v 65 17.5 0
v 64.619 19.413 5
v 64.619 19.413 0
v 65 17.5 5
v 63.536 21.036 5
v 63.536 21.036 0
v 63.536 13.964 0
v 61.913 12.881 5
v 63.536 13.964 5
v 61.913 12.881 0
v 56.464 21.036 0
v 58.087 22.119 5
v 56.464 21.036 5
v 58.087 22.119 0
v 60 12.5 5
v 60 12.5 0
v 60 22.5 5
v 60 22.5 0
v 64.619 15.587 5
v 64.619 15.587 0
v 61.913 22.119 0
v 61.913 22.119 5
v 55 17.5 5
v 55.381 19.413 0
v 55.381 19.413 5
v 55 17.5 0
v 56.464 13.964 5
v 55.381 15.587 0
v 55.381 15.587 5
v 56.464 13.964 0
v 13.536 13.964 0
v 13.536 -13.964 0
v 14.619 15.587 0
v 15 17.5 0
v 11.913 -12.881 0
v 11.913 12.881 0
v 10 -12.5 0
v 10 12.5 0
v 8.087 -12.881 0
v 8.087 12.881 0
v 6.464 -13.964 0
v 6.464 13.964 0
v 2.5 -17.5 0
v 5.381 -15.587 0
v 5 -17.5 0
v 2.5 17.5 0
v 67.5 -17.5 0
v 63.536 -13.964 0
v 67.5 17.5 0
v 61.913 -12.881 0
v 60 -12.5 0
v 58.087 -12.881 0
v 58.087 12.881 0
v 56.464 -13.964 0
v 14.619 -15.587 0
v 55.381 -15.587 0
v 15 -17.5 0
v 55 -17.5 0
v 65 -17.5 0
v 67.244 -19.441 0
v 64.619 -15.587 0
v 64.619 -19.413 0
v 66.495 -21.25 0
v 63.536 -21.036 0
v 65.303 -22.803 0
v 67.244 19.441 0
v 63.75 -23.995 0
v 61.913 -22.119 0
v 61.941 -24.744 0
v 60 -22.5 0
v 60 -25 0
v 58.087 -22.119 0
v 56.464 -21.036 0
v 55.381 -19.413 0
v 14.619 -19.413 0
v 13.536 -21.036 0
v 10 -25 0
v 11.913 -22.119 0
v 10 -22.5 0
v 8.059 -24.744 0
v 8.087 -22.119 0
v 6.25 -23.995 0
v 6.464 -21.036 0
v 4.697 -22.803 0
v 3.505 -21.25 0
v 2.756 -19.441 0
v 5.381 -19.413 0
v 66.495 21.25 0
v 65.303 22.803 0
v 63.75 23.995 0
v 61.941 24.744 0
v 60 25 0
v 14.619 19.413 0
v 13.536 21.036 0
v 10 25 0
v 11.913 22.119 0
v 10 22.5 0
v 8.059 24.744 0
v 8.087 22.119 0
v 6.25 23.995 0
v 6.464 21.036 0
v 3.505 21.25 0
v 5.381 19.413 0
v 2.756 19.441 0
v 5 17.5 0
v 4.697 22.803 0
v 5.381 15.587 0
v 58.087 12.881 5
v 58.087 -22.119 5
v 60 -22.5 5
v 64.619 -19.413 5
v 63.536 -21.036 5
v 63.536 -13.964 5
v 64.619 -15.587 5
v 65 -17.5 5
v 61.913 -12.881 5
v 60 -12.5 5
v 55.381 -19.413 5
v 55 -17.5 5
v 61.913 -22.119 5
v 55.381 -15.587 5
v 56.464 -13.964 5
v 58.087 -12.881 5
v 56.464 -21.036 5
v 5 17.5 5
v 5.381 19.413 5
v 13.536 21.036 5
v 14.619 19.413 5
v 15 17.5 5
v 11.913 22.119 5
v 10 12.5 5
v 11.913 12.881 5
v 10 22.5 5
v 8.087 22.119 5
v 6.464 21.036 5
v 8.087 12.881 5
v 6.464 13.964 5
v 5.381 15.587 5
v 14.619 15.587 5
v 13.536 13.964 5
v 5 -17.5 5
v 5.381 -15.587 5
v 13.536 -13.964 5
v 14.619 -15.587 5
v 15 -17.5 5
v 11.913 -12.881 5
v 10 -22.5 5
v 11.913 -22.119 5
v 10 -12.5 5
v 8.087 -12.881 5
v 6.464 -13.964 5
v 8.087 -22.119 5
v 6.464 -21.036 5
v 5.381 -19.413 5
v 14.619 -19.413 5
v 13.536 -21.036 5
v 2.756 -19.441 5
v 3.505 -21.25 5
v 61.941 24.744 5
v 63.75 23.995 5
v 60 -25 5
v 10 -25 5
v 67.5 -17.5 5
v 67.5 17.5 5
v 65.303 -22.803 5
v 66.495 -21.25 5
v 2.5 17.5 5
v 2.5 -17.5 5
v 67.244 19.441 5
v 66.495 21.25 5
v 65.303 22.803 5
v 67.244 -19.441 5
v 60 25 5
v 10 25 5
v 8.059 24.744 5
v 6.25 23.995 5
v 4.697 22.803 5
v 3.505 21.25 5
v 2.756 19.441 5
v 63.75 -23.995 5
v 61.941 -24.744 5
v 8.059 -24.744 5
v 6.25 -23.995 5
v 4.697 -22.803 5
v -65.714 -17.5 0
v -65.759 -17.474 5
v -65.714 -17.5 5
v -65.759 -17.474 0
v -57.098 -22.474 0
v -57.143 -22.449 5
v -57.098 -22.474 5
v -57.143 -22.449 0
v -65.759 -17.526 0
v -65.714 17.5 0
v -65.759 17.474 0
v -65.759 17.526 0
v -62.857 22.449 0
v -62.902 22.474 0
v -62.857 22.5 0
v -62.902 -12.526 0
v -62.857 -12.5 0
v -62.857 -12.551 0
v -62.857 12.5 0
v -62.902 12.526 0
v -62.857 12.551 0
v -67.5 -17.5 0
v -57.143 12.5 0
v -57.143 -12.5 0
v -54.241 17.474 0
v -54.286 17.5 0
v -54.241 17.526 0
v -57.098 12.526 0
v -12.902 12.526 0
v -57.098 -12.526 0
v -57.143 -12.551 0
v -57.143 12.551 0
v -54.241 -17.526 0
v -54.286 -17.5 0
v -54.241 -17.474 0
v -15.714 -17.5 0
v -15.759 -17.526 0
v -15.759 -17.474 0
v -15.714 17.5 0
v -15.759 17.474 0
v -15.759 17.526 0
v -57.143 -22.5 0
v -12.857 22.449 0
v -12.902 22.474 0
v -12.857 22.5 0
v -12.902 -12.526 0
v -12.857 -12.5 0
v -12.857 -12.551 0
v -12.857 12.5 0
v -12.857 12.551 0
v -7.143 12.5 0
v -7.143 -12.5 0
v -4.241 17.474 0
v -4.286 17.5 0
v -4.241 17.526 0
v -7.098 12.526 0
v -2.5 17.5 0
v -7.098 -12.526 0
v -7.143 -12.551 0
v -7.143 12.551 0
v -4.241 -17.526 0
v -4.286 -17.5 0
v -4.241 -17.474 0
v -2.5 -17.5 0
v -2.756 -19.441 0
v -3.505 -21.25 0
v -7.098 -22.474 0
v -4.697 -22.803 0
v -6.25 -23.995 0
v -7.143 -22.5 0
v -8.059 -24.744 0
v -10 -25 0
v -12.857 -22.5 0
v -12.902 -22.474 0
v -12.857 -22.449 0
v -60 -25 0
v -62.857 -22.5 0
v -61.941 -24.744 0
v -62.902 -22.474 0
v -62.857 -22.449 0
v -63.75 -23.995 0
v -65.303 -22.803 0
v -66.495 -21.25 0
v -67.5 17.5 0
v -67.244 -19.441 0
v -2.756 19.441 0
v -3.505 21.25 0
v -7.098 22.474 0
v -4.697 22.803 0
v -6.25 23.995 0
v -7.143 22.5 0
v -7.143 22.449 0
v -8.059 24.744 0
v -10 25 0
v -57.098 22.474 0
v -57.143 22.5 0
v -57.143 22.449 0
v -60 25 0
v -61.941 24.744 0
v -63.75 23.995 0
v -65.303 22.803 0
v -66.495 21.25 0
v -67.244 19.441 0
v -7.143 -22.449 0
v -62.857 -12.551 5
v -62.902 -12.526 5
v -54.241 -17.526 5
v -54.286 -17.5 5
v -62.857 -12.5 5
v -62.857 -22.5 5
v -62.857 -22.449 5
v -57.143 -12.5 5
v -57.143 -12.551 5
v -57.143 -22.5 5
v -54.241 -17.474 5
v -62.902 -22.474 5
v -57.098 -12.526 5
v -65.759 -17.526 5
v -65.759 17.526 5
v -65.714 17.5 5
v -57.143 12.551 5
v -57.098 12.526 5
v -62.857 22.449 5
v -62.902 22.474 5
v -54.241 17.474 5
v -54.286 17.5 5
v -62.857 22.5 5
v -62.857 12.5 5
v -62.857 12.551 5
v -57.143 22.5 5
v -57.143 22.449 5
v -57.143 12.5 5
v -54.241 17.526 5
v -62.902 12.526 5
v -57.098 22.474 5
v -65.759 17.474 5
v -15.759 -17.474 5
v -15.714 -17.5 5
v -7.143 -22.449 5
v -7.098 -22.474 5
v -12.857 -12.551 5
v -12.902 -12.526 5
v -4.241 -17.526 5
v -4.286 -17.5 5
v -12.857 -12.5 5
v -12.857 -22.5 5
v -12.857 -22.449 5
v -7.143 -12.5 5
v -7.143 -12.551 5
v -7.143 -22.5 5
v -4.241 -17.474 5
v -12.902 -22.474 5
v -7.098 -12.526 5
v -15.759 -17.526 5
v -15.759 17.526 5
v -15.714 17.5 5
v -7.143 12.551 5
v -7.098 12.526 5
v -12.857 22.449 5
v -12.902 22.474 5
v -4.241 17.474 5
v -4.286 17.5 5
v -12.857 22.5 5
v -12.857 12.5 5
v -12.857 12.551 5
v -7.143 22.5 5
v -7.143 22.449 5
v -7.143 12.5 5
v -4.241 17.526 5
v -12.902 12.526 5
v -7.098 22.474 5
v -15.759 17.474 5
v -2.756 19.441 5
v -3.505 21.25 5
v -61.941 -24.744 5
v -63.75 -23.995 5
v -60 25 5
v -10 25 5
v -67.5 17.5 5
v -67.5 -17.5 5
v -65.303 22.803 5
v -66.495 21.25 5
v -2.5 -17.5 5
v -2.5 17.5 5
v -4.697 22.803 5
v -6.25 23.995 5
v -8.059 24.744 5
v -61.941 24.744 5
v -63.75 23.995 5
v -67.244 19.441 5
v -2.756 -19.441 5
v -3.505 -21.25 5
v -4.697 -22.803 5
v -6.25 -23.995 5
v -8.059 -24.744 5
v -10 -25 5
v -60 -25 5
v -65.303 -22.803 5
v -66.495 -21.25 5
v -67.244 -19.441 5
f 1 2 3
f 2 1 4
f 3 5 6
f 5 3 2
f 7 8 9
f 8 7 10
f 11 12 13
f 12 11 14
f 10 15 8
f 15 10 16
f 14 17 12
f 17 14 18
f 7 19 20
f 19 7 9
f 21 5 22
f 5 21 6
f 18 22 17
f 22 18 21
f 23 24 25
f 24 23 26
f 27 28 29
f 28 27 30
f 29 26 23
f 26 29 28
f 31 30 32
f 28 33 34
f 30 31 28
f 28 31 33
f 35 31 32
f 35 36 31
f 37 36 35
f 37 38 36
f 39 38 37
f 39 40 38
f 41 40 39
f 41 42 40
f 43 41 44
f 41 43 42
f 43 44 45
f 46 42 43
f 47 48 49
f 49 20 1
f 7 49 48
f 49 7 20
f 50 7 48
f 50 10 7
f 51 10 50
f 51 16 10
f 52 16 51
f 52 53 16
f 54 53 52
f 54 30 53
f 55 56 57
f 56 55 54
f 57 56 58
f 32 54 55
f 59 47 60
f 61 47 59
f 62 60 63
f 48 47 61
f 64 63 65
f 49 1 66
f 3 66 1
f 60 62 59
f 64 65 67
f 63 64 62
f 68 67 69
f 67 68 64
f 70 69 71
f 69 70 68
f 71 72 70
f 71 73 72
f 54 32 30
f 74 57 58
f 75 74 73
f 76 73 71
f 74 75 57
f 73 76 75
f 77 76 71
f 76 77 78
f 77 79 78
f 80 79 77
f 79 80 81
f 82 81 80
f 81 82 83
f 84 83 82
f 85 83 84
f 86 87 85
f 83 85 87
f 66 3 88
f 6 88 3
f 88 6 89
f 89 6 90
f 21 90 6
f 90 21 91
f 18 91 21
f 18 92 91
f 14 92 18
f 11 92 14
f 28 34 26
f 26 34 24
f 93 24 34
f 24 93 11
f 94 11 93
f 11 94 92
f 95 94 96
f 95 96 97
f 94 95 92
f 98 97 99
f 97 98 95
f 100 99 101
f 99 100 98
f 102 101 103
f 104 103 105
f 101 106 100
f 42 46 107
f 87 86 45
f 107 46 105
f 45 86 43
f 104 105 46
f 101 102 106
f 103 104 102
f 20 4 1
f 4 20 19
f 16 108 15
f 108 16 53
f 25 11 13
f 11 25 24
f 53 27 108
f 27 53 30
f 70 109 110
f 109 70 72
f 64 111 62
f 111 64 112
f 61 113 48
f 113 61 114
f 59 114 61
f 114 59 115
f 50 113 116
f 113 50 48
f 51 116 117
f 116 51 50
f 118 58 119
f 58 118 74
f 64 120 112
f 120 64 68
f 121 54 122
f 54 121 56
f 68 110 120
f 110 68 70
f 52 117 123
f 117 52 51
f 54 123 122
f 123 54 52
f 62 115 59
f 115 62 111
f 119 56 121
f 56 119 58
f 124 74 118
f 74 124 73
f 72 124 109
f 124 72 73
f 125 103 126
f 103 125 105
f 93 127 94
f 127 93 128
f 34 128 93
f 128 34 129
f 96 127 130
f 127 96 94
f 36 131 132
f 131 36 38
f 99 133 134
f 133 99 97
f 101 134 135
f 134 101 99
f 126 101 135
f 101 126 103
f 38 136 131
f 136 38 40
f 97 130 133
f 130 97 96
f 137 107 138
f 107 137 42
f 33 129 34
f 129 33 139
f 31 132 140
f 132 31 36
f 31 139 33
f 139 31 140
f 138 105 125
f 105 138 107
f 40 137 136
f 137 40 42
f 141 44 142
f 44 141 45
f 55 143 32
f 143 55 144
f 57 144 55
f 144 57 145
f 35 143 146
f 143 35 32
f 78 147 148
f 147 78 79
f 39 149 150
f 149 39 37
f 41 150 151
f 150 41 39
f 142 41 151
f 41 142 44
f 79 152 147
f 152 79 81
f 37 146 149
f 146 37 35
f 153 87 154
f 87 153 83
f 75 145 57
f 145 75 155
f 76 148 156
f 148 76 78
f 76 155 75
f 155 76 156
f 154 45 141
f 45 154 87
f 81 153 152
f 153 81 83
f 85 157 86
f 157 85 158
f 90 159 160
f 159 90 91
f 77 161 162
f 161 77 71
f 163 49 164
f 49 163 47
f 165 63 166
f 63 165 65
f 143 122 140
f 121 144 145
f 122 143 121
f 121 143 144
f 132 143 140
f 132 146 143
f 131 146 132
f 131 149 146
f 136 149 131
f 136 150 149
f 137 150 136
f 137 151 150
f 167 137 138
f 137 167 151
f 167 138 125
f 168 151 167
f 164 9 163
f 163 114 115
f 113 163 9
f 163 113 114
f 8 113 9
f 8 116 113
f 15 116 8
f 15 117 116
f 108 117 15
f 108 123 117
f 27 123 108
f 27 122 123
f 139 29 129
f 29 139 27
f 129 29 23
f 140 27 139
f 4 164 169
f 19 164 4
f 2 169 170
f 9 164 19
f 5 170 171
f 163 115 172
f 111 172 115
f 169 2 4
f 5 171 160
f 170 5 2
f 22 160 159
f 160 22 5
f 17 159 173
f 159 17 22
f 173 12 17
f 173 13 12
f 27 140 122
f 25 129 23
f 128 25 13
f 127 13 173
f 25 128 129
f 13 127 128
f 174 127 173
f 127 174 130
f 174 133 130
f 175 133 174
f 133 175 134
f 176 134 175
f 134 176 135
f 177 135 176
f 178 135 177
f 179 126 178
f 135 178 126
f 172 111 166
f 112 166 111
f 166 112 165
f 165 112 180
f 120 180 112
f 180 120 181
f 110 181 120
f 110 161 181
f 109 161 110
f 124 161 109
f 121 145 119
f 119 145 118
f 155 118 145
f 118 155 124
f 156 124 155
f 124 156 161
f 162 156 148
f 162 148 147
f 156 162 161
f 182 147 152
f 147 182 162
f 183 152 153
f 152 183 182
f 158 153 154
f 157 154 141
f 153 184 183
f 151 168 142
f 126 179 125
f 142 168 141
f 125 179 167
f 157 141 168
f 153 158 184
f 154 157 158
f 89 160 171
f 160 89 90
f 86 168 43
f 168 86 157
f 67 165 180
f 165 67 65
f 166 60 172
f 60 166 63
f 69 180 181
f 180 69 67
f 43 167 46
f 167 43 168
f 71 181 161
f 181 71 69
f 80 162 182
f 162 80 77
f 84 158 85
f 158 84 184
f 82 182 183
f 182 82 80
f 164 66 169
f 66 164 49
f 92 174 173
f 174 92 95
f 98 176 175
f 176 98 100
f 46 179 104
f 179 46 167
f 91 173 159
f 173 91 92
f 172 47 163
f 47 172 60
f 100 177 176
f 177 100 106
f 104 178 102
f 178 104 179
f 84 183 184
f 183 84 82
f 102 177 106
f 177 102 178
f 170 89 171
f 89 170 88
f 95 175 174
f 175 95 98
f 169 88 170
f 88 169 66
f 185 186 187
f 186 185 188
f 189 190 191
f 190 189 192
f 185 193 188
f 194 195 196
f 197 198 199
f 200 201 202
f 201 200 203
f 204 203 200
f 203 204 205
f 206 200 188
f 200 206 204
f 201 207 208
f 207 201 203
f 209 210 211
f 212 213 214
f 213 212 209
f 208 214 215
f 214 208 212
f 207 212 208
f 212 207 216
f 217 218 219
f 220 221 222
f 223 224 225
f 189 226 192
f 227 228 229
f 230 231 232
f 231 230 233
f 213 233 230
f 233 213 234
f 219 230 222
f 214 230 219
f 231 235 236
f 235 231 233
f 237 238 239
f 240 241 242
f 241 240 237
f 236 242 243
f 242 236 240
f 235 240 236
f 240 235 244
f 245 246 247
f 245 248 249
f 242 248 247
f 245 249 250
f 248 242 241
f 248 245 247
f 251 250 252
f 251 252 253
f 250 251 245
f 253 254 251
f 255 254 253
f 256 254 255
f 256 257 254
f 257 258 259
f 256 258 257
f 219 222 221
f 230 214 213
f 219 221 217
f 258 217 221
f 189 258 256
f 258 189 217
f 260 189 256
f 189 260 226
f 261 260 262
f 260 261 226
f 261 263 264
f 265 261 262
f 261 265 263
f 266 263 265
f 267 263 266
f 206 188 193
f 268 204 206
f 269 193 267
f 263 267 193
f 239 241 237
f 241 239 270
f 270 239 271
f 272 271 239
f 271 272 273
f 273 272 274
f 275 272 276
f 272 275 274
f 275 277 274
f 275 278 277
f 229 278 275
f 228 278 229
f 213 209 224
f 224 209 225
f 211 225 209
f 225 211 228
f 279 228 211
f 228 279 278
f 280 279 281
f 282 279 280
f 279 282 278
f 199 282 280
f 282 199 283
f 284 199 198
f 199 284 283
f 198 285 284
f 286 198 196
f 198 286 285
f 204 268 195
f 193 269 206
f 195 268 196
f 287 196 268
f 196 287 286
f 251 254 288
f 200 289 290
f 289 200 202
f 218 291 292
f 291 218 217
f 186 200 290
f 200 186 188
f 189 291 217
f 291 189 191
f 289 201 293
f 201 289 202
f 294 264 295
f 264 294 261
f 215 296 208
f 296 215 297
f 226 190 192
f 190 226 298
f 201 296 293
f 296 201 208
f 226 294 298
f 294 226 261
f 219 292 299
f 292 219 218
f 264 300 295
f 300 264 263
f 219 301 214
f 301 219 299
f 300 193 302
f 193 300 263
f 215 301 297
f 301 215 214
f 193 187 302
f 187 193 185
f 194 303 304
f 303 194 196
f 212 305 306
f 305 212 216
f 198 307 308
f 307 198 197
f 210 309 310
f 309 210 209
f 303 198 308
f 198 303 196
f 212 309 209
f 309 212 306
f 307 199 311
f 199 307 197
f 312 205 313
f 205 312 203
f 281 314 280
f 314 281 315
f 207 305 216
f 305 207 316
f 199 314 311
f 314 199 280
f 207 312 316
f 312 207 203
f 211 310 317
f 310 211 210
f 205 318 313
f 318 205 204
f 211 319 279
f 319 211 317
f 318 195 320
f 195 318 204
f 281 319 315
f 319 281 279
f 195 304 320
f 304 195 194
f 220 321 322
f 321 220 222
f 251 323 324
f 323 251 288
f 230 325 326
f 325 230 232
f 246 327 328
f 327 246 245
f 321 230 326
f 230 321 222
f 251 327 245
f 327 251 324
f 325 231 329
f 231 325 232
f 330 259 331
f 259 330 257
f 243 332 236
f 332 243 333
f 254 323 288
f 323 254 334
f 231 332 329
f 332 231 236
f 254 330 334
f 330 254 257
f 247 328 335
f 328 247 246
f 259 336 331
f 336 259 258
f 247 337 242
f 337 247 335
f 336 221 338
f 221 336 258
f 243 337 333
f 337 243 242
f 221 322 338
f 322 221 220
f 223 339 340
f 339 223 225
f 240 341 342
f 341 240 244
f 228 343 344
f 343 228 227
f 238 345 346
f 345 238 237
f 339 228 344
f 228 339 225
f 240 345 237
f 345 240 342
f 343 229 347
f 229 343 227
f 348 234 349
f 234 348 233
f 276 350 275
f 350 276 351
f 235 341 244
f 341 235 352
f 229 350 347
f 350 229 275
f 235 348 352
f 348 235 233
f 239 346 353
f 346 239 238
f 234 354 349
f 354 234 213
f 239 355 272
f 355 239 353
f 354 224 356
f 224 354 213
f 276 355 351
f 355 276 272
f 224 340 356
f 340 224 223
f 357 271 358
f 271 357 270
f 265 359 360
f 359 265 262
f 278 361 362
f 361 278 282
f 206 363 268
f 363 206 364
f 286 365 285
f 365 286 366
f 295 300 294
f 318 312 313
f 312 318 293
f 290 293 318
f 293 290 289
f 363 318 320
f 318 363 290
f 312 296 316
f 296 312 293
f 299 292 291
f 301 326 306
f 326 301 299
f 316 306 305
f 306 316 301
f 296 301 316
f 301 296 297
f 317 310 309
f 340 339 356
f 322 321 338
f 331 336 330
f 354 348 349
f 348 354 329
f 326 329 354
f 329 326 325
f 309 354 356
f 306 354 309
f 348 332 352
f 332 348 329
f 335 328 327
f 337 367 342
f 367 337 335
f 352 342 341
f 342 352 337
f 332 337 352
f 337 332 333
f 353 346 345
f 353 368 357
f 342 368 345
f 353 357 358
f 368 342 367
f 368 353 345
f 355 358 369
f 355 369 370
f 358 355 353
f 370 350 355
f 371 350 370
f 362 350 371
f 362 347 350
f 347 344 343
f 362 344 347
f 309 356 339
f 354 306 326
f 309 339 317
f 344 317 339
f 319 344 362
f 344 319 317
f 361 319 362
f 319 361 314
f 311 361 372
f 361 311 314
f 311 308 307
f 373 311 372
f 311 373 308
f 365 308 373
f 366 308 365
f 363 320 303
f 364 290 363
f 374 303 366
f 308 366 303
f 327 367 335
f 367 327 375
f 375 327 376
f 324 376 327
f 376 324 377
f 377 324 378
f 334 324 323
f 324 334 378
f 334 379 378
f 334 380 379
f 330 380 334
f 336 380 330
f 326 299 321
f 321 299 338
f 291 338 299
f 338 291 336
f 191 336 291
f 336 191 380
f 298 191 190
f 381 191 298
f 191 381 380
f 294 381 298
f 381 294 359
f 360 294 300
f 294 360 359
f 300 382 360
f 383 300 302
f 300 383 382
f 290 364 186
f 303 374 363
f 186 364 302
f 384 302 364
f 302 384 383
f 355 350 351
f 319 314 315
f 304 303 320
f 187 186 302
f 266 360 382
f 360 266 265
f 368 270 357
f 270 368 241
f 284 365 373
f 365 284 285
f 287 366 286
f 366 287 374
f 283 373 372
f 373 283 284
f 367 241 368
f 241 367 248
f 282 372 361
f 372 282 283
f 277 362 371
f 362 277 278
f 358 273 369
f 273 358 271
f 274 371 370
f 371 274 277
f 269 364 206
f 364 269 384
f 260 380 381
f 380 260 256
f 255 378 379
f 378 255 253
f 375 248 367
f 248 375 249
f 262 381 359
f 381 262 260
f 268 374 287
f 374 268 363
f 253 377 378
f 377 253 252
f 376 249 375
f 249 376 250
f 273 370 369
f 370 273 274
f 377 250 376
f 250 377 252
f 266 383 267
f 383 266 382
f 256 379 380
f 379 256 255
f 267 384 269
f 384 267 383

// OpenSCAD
lockHolderSet
(
	diameterTopTube = 30,
	lengthLock = 50,
	diameterLock = 15,
	nutSizeOuter = 10,
	nutSizeInner = 6,
	thickness = 5,
	offset = 2,
	screwOffsetShare = 0
);

// Functions
// - Set of Top Part and Bottom Part
module lockHolderSet
(
	diameterTopTube = 30,
	lengthLock = 50,
	diameterLock = 15,
	nutSizeOuter = 10,
	nutSizeInner = 6,
	thickness = 5,
	offset = 2,
	screwOffsetShare = 0.75
)
{
	lengthTopTube = diameterLock + (2 * nutSizeOuter) + (3 * thickness);
	screwBarWidth = nutSizeOuter + (thickness / 2);

	translate(v = [(diameterTopTube / 2) + screwBarWidth + (1.5 * thickness), 0, 0]) {
		topPart(diameterTopTube, diameterLock, nutSizeOuter, nutSizeInner, thickness, offset, screwOffsetShare);
	}

	translate(v = [(-1) * ((diameterTopTube / 2) + screwBarWidth + (1.5 * thickness)), 0, 0]) {
		rotate(a = [0, 0, 180]) {
			bottomPart(diameterTopTube, lengthLock, diameterLock, nutSizeOuter, nutSizeInner, thickness, offset, screwOffsetShare);
		}
	}
}

// - Complete Set of 2 Top Parts and 2 Bottom Parts
module completeLockHolderSet
(
	diameterTopTube = 30,
	lengthLock = 50,
	diameterLock = 15,
	nutSizeOuter = 10,
	nutSizeInner = 6,
	thickness = 5,
	offset = 2,
	screwOffsetShare = 0.75
)
{
	lengthTopTube = diameterLock + (2 * nutSizeOuter) + (3 * thickness);
	screwBarWidth = nutSizeOuter + (thickness / 2);

	translate(v = [0, (lengthTopTube + thickness) / 2, 0]) {
		lockHolderSet(diameterTopTube, lengthLock, diameterLock, nutSizeOuter, nutSizeInner, thickness, offset, screwOffsetShare);
	}

	translate(v = [0, (-1) * ((lengthTopTube + thickness) / 2), 0]) {
		lockHolderSet(diameterTopTube, lengthLock, diameterLock, nutSizeOuter, nutSizeInner, thickness, offset, screwOffsetShare);
	}
}

// - Top Part
module topPart
(
	diameterTopTube = 30,
	diameterLock = 15,
	nutSizeOuter = 10,
	nutSizeInner = 6,
	thickness = 5,
	offset = 2,
	screwOffsetShare = 0.75
)
{
	lengthTopTube = diameterLock + (2 * nutSizeOuter) + (3 * thickness);
	screwBarWidth = nutSizeOuter + (thickness / 2);

	translate(v = [0, lengthTopTube / 2, 0]) {
		topPart1(lengthTopTube, diameterTopTube, diameterLock, screwBarWidth, nutSizeOuter, nutSizeInner, thickness, offset, screwOffsetShare);
	}
}

// - Bottom Part
module bottomPart
(
	diameterTopTube = 30,
	lengthLock = 50,
	diameterLock = 15,
	nutSizeOuter = 10,
	nutSizeInner = 6,
	thickness = 5,
	offset = 2,
	screwOffsetShare = 0.75
)
{
	lengthTopTube = diameterLock + (2 * nutSizeOuter) + (3 * thickness);
	screwBarWidth = nutSizeOuter + (thickness / 2);

	translate(v = [0, lengthTopTube / 2, 0]) {
		bottomPart1(lengthTopTube, diameterTopTube, lengthLock, diameterLock, screwBarWidth, nutSizeOuter, nutSizeInner, thickness, offset, screwOffsetShare);
	}
}

// Modules
module tube(height, diameter, thickness) {
	difference() {
		cylinder(h = height, r = ((diameter / 2) + thickness));
		translate(v = [0, 0, -1]) {
			cylinder(h = height + 2, r = diameter / 2);
		}
	}
}

module screwBar(nutSizeOuter, lengthTopTube, diameterTopTube, thickness, offset, screwOffsetShare) {
		union() {
			hull() {
				translate(v = [((diameterTopTube + nutSizeOuter) / 2) + thickness, thickness + (offset / 2), (nutSizeOuter + thickness) / 2]) {
					rotate(a = [90, 0, 0]) {
						cylinder(r = ((nutSizeOuter + thickness) / 2), h = thickness);
					}
				}
				translate(v = [(-1) * (((diameterTopTube + nutSizeOuter) / 2) + thickness), thickness + (offset / 2), (nutSizeOuter + thickness) / 2]) {
					rotate(a = [90, 0, 0]) {
						cylinder(r = (nutSizeOuter + thickness) / 2, h = thickness);
					}
				}
				translate(v = [((diameterTopTube + nutSizeOuter) / 2) + thickness, thickness + (offset / 2), lengthTopTube - ((nutSizeOuter + thickness) / 2) ]) {
					rotate(a = [90, 0, 0]) {
						cylinder(r = ((nutSizeOuter + thickness) / 2), h = thickness);
					}
				}
				translate(v = [(-1) * (((diameterTopTube + nutSizeOuter) / 2) + thickness), thickness + (offset / 2), lengthTopTube - ((nutSizeOuter + thickness) / 2)]) {
					rotate(a = [90, 0, 0]) {
						cylinder(r = ((nutSizeOuter + thickness) / 2), h = thickness);
					}
				}
			}
//			positionShells(nutSizeOuter, diameterTopTube + (2 * thickness), lengthTopTube, thickness, offset, screwOffsetShare);
// add again later
		}
}

module tubeWithBar(lengthTopTube, diameterTopTube, nutSizeOuter, thickness, offset, screwOffsetShare) {
	screwBar(nutSizeOuter, lengthTopTube, diameterTopTube, thickness, offset, screwOffsetShare);
}

module makeShell(diameter, thickness, offset, screwOffsetShare) {
	translate(v = [0, ((1 + screwOffsetShare) * thickness) + (offset / 2), 0]) {
		rotate(a = [90, 0, 0]) {
			cylinder(r = (diameter + thickness) / 2, h = thickness);
		}
	}
}

module makeNut(diameter, thickness, screwOffsetShare) {
	translate(v = [0, (screwOffsetShare * thickness) + 1, 0]) {
		rotate(a = [90, 0, 0]) {
			translate(v = [0, 0, (-1) * (thickness / 2)]) {
				hexagon(size = diameter, height = thickness + 2);
			}
		}
	}
}

module screwHeadHole(diameter, thickness, screwOffsetShare) {
	translate(v = [0, (screwOffsetShare * thickness), 0]) {
		rotate(a = [-90, 0, 0]) {
			cylinder(r = diameter / 2, h = thickness + 2);
		}
	}
}

module screwHole(diameter, thickness) {
	translate(v = [0, -1, 0]) {
		rotate(a = [-90, 0, 0]) {
			cylinder(r = diameter / 2, h = (2 * thickness) + 2);
		}
	}
}

module positionShells(diameter, plateSizeX, plateSizeY, thickness, offset, screwOffsetShare) {
	translate(v = [(plateSizeX + diameter) / 2, 0, ((diameter + thickness) / 2)]) {
		makeShell(diameter, thickness, offset, screwOffsetShare);
	}
	translate(v = [(plateSizeX + diameter) / 2, 0, plateSizeY - ((diameter + thickness) / 2)]) {
		makeShell(diameter, thickness, offset, screwOffsetShare);
	}
	translate(v = [(-1) * ((plateSizeX + diameter) / 2), 0, ((diameter + thickness) / 2)]) {
		makeShell(diameter, thickness, offset, screwOffsetShare);
	}
	translate(v = [(-1) * ((plateSizeX + diameter) / 2), 0, plateSizeY - ((diameter + thickness) / 2)]) {
		makeShell(diameter, thickness, offset, screwOffsetShare);
	}
}

module positionNuts(diameter, plateSizeX, plateSizeY, thickness, screwOffsetShare) {
	translate(v = [(plateSizeX + diameter) / 2, 0, ((diameter + thickness) / 2)]) {
		makeNut(diameter, thickness, screwOffsetShare);
	}
	translate(v = [(plateSizeX + diameter) / 2, 0, plateSizeY - ((diameter + thickness) / 2)]) {
		makeNut(diameter, thickness, screwOffsetShare);
	}
	translate(v = [(-1) * ((plateSizeX + diameter) / 2), 0, ((diameter + thickness) / 2)]) {
		makeNut(diameter, thickness, screwOffsetShare);
	}
	translate(v = [(-1) * ((plateSizeX + diameter) / 2), 0, plateSizeY - ((diameter + thickness) / 2)]) {
		makeNut(diameter, thickness, screwOffsetShare);
	}
}

module positionScrewHeadHoles(diameter, plateSizeX, plateSizeY, thickness, screwOffsetShare) {
	translate(v = [(plateSizeX + diameter) / 2, 0, ((diameter + thickness) / 2)]) {
		screwHeadHole(diameter, thickness, screwOffsetShare);
	}
	translate(v = [(plateSizeX + diameter) / 2, 0, plateSizeY - ((diameter + thickness) / 2)]) {
		screwHeadHole(diameter, thickness, screwOffsetShare);
	}
	translate(v = [(-1) * ((plateSizeX + diameter) / 2), 0, ((diameter + thickness) / 2)]) {
		screwHeadHole(diameter, thickness, screwOffsetShare);
	}
	translate(v = [(-1) * ((plateSizeX + diameter) / 2), 0, plateSizeY - ((diameter + thickness) / 2)]) {
		screwHeadHole(diameter, thickness, screwOffsetShare);
	}
}

module positionScrewHoles(diameterInner, diameterOuter, plateSizeX, plateSizeY, thickness) {
	translate(v = [(plateSizeX + diameterOuter) / 2, 0, ((diameterOuter + thickness) / 2)]) {
		screwHole(diameterInner, thickness);
	}
	translate(v = [(plateSizeX + diameterOuter) / 2, 0, plateSizeY - ((diameterOuter + thickness) / 2)]) {
		screwHole(diameterInner, thickness);
	}
	translate(v = [(-1) * ((plateSizeX + diameterOuter) / 2), 0, ((diameterOuter + thickness) / 2)]) {
		screwHole(diameterInner, thickness);
	}
	translate(v = [(-1) * ((plateSizeX + diameterOuter) / 2), 0, plateSizeY - ((diameterOuter + thickness) / 2)]) {
		screwHole(diameterInner, thickness);
	}
}

module nutHolesComplete(diameterOuter, diameterInner, plateSizeX, plateSizeY, thickness, offset, screwOffsetShare) {
	translate(v = [0, offset / 2, 0]) {
		union() {
			positionNuts(diameterOuter, plateSizeX, plateSizeY, thickness, screwOffsetShare);
			positionScrewHoles(diameterInner, diameterOuter, plateSizeX, plateSizeY, thickness);
		}
	}
}

module screwHeadHolesComplete(diameterOuter, diameterInner, plateSizeX, plateSizeY, thickness, offset, screwOffsetShare) {
	translate(v = [0, offset / 2, 0]) {
		union() {
			positionScrewHeadHoles(diameterOuter, plateSizeX, plateSizeY, thickness, screwOffsetShare);
			positionScrewHoles(diameterInner, diameterOuter, plateSizeX, plateSizeY, thickness);
		}
	}
}

module topPart1(lengthTopTube, diameterTopTube, diameterLock, screwBarWidth, nutSizeOuter, nutSizeInner, thickness, offset, screwOffsetShare) {
translate(v = [0, 0, (-1) * (offset / 2)]) {
		rotate(a = [90, 0, 0]) {
				difference() {
					tubeWithBar(lengthTopTube, diameterTopTube, nutSizeOuter, thickness, offset, screwOffsetShare);
#					screwHeadHolesComplete(nutSizeOuter, nutSizeInner, diameterTopTube + (2 * thickness), lengthTopTube, thickness, offset, screwOffsetShare);
				}
			}
	}
}

module bottomPart1(lengthTopTube, diameterTopTube, lengthLock, diameterLock, screwBarWidth, nutSizeOuter, nutSizeInner, thickness, offset, screwOffsetShare) {
	translate(v = [0, 0, (-1) * (offset / 2)]) {
		rotate(a = [90, 0, 0]) {
					difference() {
						tubeWithBar(lengthTopTube, diameterTopTube, nutSizeOuter, thickness, offset, screwOffsetShare);
#						nutHolesComplete(nutSizeOuter, nutSizeInner, diameterTopTube + (2 * thickness), lengthTopTube, thickness, offset, screwOffsetShare);
					}
				}
	}
}

module hexagon(size, height) {
	// http://svn.clifford.at/openscad/trunk/libraries/shapes.scad
	/*
	 *  OpenSCAD Shapes Library (www.openscad.org)
	 *  Copyright (C) 2009  Catarina Mota
	 *
	 *  This program is free software; you can redistribute it and/or modify
	 *  it under the terms of the GNU General Public License as published by
	 *  the Free Software Foundation; either version 2 of the License, or
	 *  (at your option) any later version.
	 *
	 *  This program is distributed in the hope that it will be useful,
	 *  but WITHOUT ANY WARRANTY; without even the implied warranty of
	 *  MERCHANTABILITY or FITNESS FOR A PARTICULAR PURPOSE.  See the
	 *  GNU General Public License for more details.
	 *
	 *  You should have received a copy of the GNU General Public License
	 *  along with this program; if not, write to the Free Software
	 *  Foundation, Inc., 59 Temple Place, Suite 330, Boston, MA  02111-1307  USA
	 *
	*/
	boxWidth = size/1.75;
	for (r = [-60, 0, 60]) rotate([0,0,r]) cube([boxWidth, size, height], true);
}
